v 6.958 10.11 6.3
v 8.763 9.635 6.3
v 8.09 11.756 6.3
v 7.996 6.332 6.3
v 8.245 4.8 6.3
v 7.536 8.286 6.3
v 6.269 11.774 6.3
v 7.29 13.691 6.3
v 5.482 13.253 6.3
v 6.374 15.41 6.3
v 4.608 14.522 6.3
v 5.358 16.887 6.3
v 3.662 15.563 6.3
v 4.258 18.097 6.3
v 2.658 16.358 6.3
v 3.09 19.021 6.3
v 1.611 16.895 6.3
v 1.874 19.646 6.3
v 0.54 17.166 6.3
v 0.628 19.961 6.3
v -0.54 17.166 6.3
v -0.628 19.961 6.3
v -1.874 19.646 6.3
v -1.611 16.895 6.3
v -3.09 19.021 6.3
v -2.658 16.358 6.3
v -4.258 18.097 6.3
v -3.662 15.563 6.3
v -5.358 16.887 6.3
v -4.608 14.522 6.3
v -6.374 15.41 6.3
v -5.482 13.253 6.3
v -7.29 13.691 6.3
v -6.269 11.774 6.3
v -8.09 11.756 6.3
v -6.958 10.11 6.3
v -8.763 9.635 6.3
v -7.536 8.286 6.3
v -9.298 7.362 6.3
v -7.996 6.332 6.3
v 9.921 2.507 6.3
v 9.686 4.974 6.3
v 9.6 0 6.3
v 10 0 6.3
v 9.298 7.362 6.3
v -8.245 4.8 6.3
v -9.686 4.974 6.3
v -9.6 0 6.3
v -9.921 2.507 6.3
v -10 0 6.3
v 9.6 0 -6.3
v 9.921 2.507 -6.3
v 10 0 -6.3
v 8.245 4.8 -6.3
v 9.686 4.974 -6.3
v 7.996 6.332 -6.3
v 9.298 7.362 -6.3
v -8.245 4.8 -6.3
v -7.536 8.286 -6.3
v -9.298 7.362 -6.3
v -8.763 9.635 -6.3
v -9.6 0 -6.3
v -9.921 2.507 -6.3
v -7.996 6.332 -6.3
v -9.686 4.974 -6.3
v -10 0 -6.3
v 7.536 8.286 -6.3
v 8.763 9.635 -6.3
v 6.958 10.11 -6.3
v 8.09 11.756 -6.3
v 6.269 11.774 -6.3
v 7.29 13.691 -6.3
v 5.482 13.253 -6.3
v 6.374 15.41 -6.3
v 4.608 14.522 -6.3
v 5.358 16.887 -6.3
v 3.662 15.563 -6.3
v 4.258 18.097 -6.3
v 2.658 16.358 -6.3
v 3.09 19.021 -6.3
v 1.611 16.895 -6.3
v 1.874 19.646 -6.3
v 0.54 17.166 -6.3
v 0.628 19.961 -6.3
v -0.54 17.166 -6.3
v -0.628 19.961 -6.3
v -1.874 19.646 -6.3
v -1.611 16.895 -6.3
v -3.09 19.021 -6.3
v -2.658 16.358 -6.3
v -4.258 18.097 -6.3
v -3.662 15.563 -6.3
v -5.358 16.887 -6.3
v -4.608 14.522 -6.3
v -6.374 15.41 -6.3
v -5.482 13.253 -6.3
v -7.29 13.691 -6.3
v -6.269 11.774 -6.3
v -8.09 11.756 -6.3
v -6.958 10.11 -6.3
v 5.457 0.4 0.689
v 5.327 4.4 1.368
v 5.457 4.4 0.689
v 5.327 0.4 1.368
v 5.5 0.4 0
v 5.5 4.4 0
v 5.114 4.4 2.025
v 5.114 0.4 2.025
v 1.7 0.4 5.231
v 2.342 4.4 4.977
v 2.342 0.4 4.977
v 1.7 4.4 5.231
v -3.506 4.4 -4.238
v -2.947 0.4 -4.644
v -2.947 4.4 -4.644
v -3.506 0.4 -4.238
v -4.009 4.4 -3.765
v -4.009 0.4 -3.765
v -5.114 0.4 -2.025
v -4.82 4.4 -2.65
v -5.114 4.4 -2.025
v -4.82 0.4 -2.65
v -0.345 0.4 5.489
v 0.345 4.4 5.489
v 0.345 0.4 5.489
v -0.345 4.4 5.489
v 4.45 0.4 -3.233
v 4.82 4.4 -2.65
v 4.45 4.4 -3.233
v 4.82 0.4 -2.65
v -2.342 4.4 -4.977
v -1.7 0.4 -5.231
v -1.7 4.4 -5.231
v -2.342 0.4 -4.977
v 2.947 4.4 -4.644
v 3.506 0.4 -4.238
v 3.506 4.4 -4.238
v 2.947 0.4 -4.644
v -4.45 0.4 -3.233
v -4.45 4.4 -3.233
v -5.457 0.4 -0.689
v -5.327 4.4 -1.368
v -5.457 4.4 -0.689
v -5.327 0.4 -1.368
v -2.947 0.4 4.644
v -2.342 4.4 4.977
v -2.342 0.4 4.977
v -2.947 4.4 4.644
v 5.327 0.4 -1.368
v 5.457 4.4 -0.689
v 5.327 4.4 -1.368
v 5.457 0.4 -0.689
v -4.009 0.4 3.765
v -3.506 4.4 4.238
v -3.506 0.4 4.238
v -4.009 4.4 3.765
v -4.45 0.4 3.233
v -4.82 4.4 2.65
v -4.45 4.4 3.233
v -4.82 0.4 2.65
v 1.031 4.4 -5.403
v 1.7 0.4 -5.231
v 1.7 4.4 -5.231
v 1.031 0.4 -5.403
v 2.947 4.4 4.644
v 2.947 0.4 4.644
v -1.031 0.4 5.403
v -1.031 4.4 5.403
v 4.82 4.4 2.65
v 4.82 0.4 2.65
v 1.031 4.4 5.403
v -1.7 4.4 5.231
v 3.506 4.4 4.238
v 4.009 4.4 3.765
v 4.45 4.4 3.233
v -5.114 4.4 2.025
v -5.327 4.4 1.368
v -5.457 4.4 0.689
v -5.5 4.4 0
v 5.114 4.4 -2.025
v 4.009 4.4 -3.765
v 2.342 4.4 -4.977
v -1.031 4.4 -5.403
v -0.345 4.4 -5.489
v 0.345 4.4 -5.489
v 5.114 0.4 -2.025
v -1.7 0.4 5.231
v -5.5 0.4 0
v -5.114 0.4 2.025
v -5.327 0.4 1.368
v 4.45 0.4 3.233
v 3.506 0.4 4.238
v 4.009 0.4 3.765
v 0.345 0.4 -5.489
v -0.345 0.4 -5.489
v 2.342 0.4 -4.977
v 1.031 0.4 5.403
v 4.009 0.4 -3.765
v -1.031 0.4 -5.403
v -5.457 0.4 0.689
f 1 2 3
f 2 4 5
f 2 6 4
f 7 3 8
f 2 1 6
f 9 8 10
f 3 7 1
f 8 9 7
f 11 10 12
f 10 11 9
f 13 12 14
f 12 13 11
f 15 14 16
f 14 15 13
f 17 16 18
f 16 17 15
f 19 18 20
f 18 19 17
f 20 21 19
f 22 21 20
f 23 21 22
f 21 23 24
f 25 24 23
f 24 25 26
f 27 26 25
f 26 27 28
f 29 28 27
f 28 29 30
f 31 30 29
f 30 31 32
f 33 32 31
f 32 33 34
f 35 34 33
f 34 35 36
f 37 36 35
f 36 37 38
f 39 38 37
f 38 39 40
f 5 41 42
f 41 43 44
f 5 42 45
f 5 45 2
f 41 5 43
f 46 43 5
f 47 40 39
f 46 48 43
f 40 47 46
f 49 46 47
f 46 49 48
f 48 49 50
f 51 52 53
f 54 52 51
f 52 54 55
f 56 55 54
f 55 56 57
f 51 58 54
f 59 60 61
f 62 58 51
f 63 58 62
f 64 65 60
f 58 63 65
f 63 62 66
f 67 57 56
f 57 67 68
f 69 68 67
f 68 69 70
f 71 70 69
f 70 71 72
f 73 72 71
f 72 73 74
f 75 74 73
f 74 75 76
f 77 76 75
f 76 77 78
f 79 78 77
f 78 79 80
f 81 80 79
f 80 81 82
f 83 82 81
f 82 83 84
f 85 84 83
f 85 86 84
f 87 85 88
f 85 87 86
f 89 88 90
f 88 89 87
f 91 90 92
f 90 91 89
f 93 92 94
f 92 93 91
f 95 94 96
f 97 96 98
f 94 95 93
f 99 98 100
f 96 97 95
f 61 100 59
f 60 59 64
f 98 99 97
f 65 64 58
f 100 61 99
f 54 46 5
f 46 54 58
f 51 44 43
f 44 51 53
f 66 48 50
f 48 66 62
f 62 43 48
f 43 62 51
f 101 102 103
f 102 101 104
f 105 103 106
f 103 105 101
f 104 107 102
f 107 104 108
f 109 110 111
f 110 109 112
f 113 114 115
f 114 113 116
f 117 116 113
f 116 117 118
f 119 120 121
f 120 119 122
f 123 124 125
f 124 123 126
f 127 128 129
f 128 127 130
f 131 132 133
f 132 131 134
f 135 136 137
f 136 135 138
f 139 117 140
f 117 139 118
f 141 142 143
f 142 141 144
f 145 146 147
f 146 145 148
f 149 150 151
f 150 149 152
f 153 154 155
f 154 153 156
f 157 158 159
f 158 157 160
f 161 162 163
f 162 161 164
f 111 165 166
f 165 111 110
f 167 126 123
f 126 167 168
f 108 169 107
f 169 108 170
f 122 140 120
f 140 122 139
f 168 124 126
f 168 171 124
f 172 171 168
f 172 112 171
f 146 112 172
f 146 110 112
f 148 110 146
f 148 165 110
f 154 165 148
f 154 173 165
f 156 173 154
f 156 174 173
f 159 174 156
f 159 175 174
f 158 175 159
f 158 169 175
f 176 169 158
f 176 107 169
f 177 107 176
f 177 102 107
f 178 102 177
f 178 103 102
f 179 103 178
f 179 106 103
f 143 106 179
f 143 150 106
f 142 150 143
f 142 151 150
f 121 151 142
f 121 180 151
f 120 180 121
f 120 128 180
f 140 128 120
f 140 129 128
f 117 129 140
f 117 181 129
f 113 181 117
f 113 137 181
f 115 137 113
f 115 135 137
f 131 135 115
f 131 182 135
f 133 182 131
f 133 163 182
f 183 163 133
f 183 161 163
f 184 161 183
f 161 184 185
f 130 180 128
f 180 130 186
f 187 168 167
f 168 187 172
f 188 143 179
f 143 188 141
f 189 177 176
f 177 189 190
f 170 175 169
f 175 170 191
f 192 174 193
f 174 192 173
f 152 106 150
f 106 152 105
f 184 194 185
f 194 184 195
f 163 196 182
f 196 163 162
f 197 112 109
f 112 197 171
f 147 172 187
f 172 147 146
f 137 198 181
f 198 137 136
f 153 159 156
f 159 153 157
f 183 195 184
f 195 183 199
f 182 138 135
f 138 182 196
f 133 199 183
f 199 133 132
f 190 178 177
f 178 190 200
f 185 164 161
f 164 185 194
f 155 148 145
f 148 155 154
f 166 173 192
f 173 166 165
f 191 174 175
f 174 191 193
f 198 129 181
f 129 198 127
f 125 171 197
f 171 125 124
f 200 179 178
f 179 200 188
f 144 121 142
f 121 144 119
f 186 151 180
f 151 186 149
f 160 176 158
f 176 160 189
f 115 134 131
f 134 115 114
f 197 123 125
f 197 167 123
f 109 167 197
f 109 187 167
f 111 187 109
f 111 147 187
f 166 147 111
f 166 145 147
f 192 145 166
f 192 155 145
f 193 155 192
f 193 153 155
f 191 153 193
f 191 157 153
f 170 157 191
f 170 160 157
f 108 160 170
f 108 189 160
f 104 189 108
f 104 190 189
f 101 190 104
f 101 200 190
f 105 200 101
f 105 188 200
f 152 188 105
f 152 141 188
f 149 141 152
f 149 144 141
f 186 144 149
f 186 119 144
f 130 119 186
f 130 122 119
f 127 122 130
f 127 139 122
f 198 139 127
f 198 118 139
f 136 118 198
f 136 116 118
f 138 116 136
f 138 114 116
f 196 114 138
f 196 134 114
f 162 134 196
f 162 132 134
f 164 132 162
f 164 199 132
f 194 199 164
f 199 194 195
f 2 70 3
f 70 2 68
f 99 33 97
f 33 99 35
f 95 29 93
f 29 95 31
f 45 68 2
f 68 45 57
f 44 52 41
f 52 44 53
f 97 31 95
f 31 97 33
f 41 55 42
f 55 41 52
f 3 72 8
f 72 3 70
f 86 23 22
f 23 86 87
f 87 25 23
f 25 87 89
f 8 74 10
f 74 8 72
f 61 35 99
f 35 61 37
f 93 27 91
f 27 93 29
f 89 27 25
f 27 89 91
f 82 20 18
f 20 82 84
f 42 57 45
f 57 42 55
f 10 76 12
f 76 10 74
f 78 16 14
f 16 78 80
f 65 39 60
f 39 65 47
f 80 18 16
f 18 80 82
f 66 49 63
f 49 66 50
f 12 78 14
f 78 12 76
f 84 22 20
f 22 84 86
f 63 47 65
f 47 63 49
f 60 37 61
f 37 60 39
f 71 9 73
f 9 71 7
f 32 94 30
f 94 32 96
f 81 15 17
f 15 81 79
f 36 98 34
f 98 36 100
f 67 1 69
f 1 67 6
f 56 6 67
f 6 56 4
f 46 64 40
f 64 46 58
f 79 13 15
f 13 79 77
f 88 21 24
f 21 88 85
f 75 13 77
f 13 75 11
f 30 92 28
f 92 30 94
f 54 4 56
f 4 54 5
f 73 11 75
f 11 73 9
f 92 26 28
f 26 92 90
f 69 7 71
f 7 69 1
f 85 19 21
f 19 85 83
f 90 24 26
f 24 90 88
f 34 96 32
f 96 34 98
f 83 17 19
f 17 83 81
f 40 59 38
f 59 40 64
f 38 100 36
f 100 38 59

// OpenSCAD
// file: ../../../gospel.scad
/**
 * GOSPEL: George's OpenSCAD Procedural Enhancement Library
 * @author glaza
 *
 * Index:
 *      Translation: x, y, z, xy, xz, yz, xyz (displacement, variation)
 *      Scaling:     sx, sy, sz, sxy, sxz, syz, s (factor, variation)
 *      Rotation:    rx, ry, rz (angle, variation)
 *      Duplication: dx, dy, dz ()
 */
use <3rd_party/threads-library-by-cuiso-v1.scad>

/**
 * Translates the children in the X,Y,Z direction
 * @param d Displacement in X,Y,Z direction
 * @param variation The random variation + or - added to the displacement * 
 *  x      Translate X
 *  y      Translate Y
 *  z      Translate Z
 *  xy     Translate equaly in X and Y
 *  xz     Translate equaly in X and Z
 *  yz     Translate equaly in Y and Z
 *  xyz    Translate equaly in X, Y and Z
 */
function rand(value, variation=0) = value + rands(-variation,variation,1)[0]; 
 
module x(dx, variation=0) 
{   
    vx = rands(-variation,variation,1)[0];
    translate([dx+vx,0,0])
    children();
}
module y(dy, variation=0) 
{   
    vy = rands(-variation,variation,1)[0];
    translate([0,dy+vy,0])
    children();
} 
module z(dz, variation=0) 
{   
    vz = rands(-variation,variation,1)[0];
    translate([0,0,dz+vz])
    children();
}
module xy(d, variation=0) 
{   
    x(d, variation)
    y(d, variation)
    children();
}
module yz(d, variation=0) 
{   
    z(d, variation)
    y(d, variation)
    children();
}
module xz(d, variation=0) 
{   
    x(d, variation)
    z(d, variation)
    children();
}
module xyz(d, variation=0) 
{   
    xy(d, variation)
    z(d, variation)
    children();
}

/**
 * Rotates the children around the X axis
 * @param angle Degrees to rotate around the X axis
 * @param variation The random variation + or - added
 *  rx     Rotate around X
 *  ry     Rotate around Y
 *  rz     Rotate around Z
 */
module rx(angle, variation=0) 
{   
    v = rands(-variation,variation,1)[0];
    rotate([angle+v,0,0])
    children();
}
module ry(angle, variation=0) 
{   
    v = rands(-variation,variation,1)[0];
    rotate([0,angle+v,0])
    children();
}
module rz(angle, variation=0) 
{   
    v = rands(-variation,variation,1)[0];
    rotate([0,0,angle+v])
    children();
}

/**
 * Duplicates the children across the different planes.
 *      dx: YZ plane, dy: XZ plane, dz: XY plane
 */
module dx() 
{
    mirror([1,0,0])
    children();

    children();
}
module dy() 
{
    mirror([0,1,0])
    children();

    children();
}
module dz() 
{
    mirror([0,0,1])
    children();

    children();
}

/**
 * Mirrors across diferent planes.
 *      mx: YZ plane, my: XZ plane, mz: XY plane
 */
module mx() 
{
    mirror([1,0,0])
    children();
}
module my() 
{
    mirror([0,1,0])
    children();
}
module mz() 
{
    mirror([0,0,1])
    children();
}

/**
 * Scales in different directions
 *      mx: YZ plane, my: XZ plane, mz: XY plane
 */
module sx(factor, variation=0) 
{
    scaleFactor = rand(factor, variation);
    scale([scaleFactor,1,1])
    children();
}
module sy(factor, variation=0) 
{
    scaleFactor = rand(factor, variation);
    scale([1,scaleFactor,1])
    children();
}
module sz(factor, variation=0) 
{
    scaleFactor = rand(factor, variation);
    scale([1,1,scaleFactor])
    children();
}
module sxy(factor, variation=0) 
{
    sx(factor, variation)
    sy(factor, variation)
    children();
}
module syz(factor, variation=0) 
{
    sz(factor, variation)
    sy(factor, variation)
    children();
}
module sxz(factor, variation=0) 
{   
    sx(factor, variation)
    sz(factor, variation)
    children();
}
module s(factor, variation=0) 
{   
    sxy(factor, variation)
    sz(factor, variation)
    children();
}

/**
 * Shortcuts
 */
module diff() //does not work
{
    difference()
    {
        children();
    }
}


/**
 * Colours
 */
module red()     { color("Red") children(); }
module blue()    { color("RoyalBlue") children(); }
module green()   { color("Green") children(); }
module black()   { color("Black") children(); }
module white()   { color("White") children(); }
module cyan()    { color("Cyan") children(); }
module magenta() { color("Magenta") children(); }
module yellow()  { color("Yellow") children(); }
module glass()   { color([0.5, 0.5, 1], 0.25) children(); }

/**
 * shapes
 * @param size A vector passed to the cube
 * @param r The radius of the sphere
 * @param half Whether all corners or only top ones
 */
module rounded(size, r, half)
{
    radius = half
        ? min(r, 0.999*min(size[0]/2, size[1]/2, size[2]))
        : min(r, 0.999*min(size)/2);
    
    diameter = 2*radius;
    width = size[0] - diameter;
    height = size[1] - diameter;
    depth = half 
        ? (size[2] - radius) 
        : size[2] - diameter;
    shift = half ? radius : 0; 
    
    intersection()
    {
        z(-shift)
        xyz(radius)
        minkowski()
        {
            sphere(radius);
            cube([width,height,depth]);
        }
        
        cube(size);
    }
}

module screw(d, h, center=false) {
    z(center ? -h : 0)
    thread_for_screw(diameter=d - 1, length=h);
}

module thread(d, h, center=false) {
    z(center ? -h : 0)
    thread_for_nut(diameter=d, length=h); 
}
// main file
use <../../../gospel.scad>

$fn = 50;
LAYER = 0.2;
OUTER_RADIUS = 10;
INNER_RADIUS = OUTER_RADIUS-1.4;
OUTER_DIAMETER = 2*OUTER_RADIUS;

MAGNET_HEIGHT = 4;
MAGNET_DIAMETER = 11;
MAGNET_MARGIN = 7;
MAGNET_DEPTH = 2*LAYER;

HEIGHT = MAGNET_DIAMETER + 4*MAGNET_DEPTH;

#!body();

magnet();

module body() {
    difference() {
        y(MAGNET_HEIGHT/2+MAGNET_DEPTH)
        cube([OUTER_DIAMETER-2*MAGNET_DEPTH, MAGNET_HEIGHT+2*MAGNET_DEPTH, HEIGHT], center=true);
        
        magnet();
    }
        
    sy(2) {
        difference() {
            cylinder(h=HEIGHT, r=OUTER_RADIUS, center=true);
            cylinder(h=HEIGHT+1, r=INNER_RADIUS, center=true);
            y(-50) cube([100,100,100], center=true);
        }
        
        //sz(3) s(25) import("Braid3.stl");
        //sz(4) s(24.5) import("Braid4.stl");
    }
}

module magnet() {
    y(MAGNET_HEIGHT/2 + MAGNET_DEPTH)
    rx(90)
    cylinder(h=MAGNET_HEIGHT, d=MAGNET_DIAMETER, center=true);
}
